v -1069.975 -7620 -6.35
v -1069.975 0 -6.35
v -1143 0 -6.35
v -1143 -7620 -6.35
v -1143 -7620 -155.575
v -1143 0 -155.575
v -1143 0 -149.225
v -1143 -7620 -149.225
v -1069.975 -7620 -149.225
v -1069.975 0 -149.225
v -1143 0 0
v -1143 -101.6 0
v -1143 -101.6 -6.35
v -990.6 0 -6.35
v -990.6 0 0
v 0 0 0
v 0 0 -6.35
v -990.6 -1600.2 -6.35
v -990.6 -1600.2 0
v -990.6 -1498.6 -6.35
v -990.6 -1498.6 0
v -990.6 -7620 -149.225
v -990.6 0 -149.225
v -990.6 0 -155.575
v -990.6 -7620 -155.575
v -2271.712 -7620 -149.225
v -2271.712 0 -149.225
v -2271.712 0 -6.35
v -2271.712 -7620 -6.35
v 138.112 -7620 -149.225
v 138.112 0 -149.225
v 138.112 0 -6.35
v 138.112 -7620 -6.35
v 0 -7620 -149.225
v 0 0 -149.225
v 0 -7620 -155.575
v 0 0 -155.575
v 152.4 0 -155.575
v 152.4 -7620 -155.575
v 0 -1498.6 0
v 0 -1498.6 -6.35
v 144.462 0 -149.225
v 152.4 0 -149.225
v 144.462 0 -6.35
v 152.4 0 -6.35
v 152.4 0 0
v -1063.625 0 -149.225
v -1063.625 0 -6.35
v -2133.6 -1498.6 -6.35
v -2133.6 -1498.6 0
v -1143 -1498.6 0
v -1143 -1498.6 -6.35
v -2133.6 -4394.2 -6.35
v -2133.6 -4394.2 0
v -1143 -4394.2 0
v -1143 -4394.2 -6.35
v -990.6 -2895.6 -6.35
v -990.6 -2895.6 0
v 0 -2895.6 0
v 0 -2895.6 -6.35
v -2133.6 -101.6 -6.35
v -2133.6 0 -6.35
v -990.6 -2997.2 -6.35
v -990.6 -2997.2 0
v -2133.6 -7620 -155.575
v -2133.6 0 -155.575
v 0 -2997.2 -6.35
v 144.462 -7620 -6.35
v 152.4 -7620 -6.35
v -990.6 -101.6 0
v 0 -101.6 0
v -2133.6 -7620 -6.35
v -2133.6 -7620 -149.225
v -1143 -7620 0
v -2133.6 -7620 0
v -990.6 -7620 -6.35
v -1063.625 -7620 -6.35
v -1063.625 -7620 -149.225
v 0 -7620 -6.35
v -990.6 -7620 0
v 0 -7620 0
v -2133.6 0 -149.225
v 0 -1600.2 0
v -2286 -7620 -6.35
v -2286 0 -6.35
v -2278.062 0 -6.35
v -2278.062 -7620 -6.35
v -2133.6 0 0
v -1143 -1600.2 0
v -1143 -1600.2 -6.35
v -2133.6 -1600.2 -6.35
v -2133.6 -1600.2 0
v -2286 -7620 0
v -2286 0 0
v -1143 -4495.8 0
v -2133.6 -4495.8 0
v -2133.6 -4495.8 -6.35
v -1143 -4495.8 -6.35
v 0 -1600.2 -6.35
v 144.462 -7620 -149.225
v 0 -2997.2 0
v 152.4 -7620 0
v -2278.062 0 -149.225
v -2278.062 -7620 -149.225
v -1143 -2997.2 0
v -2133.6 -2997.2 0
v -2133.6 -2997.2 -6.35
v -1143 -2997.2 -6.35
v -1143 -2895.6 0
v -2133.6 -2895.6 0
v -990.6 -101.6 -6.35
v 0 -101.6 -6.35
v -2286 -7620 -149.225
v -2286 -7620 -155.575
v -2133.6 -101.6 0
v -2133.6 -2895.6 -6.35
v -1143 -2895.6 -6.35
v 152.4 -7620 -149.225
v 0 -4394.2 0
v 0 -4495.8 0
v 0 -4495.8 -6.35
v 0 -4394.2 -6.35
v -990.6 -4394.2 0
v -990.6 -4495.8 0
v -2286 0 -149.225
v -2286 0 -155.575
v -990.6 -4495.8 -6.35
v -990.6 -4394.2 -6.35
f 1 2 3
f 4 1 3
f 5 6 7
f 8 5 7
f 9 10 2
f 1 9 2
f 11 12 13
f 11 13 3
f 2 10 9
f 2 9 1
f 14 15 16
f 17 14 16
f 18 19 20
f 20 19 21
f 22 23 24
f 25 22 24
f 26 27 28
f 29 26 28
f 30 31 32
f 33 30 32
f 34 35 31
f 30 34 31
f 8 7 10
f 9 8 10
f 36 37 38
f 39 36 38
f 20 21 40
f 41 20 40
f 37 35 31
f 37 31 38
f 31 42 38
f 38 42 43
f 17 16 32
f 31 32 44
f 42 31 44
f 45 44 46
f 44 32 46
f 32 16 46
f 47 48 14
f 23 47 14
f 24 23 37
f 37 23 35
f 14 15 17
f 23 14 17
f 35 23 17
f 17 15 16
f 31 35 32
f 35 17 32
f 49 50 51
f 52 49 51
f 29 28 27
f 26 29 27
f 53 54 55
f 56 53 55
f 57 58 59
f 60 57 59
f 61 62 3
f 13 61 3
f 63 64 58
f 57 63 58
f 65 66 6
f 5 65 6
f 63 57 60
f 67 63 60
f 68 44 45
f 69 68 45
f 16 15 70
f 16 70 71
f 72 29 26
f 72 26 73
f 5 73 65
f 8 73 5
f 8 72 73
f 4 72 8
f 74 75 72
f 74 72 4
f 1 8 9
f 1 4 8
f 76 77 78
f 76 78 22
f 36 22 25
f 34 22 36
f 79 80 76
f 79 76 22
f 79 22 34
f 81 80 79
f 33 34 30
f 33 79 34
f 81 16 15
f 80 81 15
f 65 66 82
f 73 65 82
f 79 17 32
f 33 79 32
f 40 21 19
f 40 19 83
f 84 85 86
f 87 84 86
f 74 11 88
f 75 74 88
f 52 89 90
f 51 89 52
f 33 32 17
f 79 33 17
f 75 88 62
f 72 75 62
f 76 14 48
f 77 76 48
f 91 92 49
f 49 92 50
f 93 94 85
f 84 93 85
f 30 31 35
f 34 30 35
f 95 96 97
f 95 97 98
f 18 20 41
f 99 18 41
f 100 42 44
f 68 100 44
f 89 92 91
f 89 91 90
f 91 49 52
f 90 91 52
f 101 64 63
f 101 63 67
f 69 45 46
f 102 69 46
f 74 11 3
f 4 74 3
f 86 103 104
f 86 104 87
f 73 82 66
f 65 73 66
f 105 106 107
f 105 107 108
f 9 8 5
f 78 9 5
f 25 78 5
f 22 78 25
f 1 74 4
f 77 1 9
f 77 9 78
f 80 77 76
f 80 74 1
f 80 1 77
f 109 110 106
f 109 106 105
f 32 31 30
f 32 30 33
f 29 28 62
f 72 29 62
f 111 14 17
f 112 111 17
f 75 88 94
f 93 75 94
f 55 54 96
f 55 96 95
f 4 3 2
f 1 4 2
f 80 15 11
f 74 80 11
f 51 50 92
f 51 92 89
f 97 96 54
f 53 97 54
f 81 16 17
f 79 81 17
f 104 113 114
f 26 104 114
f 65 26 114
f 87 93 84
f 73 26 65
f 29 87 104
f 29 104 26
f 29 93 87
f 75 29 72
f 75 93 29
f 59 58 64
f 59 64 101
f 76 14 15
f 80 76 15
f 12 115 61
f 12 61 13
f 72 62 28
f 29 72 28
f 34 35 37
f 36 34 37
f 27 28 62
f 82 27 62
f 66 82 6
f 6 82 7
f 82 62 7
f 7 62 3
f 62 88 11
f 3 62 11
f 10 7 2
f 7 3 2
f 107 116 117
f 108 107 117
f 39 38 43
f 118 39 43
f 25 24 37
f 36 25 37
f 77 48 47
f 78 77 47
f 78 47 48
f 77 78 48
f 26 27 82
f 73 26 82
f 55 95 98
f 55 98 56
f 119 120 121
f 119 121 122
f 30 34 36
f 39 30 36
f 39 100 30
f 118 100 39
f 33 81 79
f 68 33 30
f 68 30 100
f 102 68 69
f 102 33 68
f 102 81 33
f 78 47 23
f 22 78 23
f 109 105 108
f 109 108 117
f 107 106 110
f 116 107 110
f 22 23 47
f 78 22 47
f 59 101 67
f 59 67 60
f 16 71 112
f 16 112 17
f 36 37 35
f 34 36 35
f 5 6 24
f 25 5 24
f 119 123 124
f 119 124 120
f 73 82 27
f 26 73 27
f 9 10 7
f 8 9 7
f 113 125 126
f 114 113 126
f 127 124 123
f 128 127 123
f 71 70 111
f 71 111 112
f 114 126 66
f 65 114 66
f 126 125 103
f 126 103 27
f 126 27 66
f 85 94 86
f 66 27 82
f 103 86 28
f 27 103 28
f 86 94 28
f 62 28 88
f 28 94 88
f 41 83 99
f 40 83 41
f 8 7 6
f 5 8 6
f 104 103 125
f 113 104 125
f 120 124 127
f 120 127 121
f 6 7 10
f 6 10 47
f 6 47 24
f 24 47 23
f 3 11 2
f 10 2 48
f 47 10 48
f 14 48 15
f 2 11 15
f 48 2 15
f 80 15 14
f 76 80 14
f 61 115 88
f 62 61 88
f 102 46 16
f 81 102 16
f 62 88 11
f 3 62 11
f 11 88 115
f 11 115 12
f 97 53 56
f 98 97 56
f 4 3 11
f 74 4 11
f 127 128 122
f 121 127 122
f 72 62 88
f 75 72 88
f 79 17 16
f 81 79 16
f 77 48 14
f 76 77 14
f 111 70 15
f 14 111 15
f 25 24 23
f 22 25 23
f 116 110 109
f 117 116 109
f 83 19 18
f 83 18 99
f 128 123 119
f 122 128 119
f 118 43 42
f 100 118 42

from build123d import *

# Parameters (mm, degrees)
F0_W     = 6.35
F0_H     = 142.875
F1_DEPTH = 7620
F2_W     = 6.35
F2_H     = 142.875
F3_DEPTH = 7620
F4_W     = 6.35
F4_H     = 142.875
F5_DEPTH = 7620
F7_DEPTH = 7620
F8_W     = 990.6
F8_H     = 101.6
F9_DEPTH = 6.35


with BuildPart() as f1:
    # F0 (on Front) → F1 (new body)
    with BuildSketch(Plane.XZ):
        Polygon((152.4, 0), (0, 0), (0, -6.35), (138.1125, -6.35), (144.4625, -6.35), (152.4, -6.35), align=None)
        with Locations((141.2875, -77.7875)):
            Rectangle(F0_W, F0_H)
        Polygon((144.4625, -149.225), (138.1125, -149.225), (0, -149.225), (0, -155.575), (152.4, -155.575), (152.4, -149.225), align=None)
    extrude(amount=F1_DEPTH)


with BuildPart() as f3:
    # F2 (on Front) → F3 (new body)
    with BuildSketch(Plane.XZ):
        Polygon((-2133.6, 0), (-2286, 0), (-2286, -6.35), (-2278.0625, -6.35), (-2271.7125, -6.35), (-2133.6, -6.35), align=None)
        with Locations((-2274.8875, -77.7875)):
            Rectangle(F2_W, F2_H)
        Polygon((-2271.7125, -149.225), (-2278.0625, -149.225), (-2286, -149.225), (-2286, -155.575), (-2133.6, -155.575), (-2133.6, -149.225), align=None)
    extrude(amount=F3_DEPTH)


with BuildPart() as f5:
    # F4 (on Front) → F5 (new body)
    with BuildSketch(Plane.XZ):
        Polygon((-990.6, 0), (-1143, 0), (-1143, -6.35), (-1069.975, -6.35), (-1063.625, -6.35), (-990.6, -6.35), align=None)
        with Locations((-1066.8, -77.7875)):
            Rectangle(F4_W, F4_H)
        Polygon((-1063.625, -149.225), (-1069.975, -149.225), (-1143, -149.225), (-1143, -155.575), (-990.6, -155.575), (-990.6, -149.225), align=None)
    extrude(amount=F5_DEPTH)


with BuildPart() as f7:
    # F6 (on Front) → F7 (new body)
    with BuildSketch(Plane.XZ):
        Polygon((0, -6.35), (0, 0), (-990.6, 0), (-990.6, -6.35), (-1063.625, -6.35), (-1063.625, -149.225), (-990.6, -149.225), (-990.6, -155.575), (0, -155.575), (0, -149.225), (138.1125, -149.225), (138.1125, -6.35), align=None)
        Polygon((-1143, -6.35), (-1143, 0), (-2133.6, 0), (-2133.6, -6.35), (-2271.7125, -6.35), (-2271.7125, -149.225), (-2133.6, -149.225), (-2133.6, -155.575), (-1143, -155.575), (-1143, -149.225), (-1069.975, -149.225), (-1069.975, -6.35), align=None)
    extrude(amount=F7_DEPTH)


with BuildPart() as f9:
    # F8 (on face) → F9 (new body)
    with BuildSketch(Plane.XY):
        with Locations((-495.3, -1549.4)):
            Rectangle(F8_W, F8_H)
        with Locations((-1638.3, -1549.4)):
            Rectangle(F8_W, F8_H)
        with Locations((-1638.3, -50.8)):
            Rectangle(F8_W, F8_H)
        with Locations((-495.3, -50.8)):
            Rectangle(F8_W, F8_H)
        with Locations((-495.3, -2946.4)):
            Rectangle(F8_W, F8_H)
        with Locations((-1638.3, -2946.4)):
            Rectangle(F8_W, F8_H)
        with Locations((-495.3, -4445)):
            Rectangle(F8_W, F8_H)
        with Locations((-1638.3, -4445)):
            Rectangle(F8_W, F8_H)
    extrude(amount=-F9_DEPTH)


solid = Compound([f1.part, f3.part, f5.part, f7.part, f9.part])
